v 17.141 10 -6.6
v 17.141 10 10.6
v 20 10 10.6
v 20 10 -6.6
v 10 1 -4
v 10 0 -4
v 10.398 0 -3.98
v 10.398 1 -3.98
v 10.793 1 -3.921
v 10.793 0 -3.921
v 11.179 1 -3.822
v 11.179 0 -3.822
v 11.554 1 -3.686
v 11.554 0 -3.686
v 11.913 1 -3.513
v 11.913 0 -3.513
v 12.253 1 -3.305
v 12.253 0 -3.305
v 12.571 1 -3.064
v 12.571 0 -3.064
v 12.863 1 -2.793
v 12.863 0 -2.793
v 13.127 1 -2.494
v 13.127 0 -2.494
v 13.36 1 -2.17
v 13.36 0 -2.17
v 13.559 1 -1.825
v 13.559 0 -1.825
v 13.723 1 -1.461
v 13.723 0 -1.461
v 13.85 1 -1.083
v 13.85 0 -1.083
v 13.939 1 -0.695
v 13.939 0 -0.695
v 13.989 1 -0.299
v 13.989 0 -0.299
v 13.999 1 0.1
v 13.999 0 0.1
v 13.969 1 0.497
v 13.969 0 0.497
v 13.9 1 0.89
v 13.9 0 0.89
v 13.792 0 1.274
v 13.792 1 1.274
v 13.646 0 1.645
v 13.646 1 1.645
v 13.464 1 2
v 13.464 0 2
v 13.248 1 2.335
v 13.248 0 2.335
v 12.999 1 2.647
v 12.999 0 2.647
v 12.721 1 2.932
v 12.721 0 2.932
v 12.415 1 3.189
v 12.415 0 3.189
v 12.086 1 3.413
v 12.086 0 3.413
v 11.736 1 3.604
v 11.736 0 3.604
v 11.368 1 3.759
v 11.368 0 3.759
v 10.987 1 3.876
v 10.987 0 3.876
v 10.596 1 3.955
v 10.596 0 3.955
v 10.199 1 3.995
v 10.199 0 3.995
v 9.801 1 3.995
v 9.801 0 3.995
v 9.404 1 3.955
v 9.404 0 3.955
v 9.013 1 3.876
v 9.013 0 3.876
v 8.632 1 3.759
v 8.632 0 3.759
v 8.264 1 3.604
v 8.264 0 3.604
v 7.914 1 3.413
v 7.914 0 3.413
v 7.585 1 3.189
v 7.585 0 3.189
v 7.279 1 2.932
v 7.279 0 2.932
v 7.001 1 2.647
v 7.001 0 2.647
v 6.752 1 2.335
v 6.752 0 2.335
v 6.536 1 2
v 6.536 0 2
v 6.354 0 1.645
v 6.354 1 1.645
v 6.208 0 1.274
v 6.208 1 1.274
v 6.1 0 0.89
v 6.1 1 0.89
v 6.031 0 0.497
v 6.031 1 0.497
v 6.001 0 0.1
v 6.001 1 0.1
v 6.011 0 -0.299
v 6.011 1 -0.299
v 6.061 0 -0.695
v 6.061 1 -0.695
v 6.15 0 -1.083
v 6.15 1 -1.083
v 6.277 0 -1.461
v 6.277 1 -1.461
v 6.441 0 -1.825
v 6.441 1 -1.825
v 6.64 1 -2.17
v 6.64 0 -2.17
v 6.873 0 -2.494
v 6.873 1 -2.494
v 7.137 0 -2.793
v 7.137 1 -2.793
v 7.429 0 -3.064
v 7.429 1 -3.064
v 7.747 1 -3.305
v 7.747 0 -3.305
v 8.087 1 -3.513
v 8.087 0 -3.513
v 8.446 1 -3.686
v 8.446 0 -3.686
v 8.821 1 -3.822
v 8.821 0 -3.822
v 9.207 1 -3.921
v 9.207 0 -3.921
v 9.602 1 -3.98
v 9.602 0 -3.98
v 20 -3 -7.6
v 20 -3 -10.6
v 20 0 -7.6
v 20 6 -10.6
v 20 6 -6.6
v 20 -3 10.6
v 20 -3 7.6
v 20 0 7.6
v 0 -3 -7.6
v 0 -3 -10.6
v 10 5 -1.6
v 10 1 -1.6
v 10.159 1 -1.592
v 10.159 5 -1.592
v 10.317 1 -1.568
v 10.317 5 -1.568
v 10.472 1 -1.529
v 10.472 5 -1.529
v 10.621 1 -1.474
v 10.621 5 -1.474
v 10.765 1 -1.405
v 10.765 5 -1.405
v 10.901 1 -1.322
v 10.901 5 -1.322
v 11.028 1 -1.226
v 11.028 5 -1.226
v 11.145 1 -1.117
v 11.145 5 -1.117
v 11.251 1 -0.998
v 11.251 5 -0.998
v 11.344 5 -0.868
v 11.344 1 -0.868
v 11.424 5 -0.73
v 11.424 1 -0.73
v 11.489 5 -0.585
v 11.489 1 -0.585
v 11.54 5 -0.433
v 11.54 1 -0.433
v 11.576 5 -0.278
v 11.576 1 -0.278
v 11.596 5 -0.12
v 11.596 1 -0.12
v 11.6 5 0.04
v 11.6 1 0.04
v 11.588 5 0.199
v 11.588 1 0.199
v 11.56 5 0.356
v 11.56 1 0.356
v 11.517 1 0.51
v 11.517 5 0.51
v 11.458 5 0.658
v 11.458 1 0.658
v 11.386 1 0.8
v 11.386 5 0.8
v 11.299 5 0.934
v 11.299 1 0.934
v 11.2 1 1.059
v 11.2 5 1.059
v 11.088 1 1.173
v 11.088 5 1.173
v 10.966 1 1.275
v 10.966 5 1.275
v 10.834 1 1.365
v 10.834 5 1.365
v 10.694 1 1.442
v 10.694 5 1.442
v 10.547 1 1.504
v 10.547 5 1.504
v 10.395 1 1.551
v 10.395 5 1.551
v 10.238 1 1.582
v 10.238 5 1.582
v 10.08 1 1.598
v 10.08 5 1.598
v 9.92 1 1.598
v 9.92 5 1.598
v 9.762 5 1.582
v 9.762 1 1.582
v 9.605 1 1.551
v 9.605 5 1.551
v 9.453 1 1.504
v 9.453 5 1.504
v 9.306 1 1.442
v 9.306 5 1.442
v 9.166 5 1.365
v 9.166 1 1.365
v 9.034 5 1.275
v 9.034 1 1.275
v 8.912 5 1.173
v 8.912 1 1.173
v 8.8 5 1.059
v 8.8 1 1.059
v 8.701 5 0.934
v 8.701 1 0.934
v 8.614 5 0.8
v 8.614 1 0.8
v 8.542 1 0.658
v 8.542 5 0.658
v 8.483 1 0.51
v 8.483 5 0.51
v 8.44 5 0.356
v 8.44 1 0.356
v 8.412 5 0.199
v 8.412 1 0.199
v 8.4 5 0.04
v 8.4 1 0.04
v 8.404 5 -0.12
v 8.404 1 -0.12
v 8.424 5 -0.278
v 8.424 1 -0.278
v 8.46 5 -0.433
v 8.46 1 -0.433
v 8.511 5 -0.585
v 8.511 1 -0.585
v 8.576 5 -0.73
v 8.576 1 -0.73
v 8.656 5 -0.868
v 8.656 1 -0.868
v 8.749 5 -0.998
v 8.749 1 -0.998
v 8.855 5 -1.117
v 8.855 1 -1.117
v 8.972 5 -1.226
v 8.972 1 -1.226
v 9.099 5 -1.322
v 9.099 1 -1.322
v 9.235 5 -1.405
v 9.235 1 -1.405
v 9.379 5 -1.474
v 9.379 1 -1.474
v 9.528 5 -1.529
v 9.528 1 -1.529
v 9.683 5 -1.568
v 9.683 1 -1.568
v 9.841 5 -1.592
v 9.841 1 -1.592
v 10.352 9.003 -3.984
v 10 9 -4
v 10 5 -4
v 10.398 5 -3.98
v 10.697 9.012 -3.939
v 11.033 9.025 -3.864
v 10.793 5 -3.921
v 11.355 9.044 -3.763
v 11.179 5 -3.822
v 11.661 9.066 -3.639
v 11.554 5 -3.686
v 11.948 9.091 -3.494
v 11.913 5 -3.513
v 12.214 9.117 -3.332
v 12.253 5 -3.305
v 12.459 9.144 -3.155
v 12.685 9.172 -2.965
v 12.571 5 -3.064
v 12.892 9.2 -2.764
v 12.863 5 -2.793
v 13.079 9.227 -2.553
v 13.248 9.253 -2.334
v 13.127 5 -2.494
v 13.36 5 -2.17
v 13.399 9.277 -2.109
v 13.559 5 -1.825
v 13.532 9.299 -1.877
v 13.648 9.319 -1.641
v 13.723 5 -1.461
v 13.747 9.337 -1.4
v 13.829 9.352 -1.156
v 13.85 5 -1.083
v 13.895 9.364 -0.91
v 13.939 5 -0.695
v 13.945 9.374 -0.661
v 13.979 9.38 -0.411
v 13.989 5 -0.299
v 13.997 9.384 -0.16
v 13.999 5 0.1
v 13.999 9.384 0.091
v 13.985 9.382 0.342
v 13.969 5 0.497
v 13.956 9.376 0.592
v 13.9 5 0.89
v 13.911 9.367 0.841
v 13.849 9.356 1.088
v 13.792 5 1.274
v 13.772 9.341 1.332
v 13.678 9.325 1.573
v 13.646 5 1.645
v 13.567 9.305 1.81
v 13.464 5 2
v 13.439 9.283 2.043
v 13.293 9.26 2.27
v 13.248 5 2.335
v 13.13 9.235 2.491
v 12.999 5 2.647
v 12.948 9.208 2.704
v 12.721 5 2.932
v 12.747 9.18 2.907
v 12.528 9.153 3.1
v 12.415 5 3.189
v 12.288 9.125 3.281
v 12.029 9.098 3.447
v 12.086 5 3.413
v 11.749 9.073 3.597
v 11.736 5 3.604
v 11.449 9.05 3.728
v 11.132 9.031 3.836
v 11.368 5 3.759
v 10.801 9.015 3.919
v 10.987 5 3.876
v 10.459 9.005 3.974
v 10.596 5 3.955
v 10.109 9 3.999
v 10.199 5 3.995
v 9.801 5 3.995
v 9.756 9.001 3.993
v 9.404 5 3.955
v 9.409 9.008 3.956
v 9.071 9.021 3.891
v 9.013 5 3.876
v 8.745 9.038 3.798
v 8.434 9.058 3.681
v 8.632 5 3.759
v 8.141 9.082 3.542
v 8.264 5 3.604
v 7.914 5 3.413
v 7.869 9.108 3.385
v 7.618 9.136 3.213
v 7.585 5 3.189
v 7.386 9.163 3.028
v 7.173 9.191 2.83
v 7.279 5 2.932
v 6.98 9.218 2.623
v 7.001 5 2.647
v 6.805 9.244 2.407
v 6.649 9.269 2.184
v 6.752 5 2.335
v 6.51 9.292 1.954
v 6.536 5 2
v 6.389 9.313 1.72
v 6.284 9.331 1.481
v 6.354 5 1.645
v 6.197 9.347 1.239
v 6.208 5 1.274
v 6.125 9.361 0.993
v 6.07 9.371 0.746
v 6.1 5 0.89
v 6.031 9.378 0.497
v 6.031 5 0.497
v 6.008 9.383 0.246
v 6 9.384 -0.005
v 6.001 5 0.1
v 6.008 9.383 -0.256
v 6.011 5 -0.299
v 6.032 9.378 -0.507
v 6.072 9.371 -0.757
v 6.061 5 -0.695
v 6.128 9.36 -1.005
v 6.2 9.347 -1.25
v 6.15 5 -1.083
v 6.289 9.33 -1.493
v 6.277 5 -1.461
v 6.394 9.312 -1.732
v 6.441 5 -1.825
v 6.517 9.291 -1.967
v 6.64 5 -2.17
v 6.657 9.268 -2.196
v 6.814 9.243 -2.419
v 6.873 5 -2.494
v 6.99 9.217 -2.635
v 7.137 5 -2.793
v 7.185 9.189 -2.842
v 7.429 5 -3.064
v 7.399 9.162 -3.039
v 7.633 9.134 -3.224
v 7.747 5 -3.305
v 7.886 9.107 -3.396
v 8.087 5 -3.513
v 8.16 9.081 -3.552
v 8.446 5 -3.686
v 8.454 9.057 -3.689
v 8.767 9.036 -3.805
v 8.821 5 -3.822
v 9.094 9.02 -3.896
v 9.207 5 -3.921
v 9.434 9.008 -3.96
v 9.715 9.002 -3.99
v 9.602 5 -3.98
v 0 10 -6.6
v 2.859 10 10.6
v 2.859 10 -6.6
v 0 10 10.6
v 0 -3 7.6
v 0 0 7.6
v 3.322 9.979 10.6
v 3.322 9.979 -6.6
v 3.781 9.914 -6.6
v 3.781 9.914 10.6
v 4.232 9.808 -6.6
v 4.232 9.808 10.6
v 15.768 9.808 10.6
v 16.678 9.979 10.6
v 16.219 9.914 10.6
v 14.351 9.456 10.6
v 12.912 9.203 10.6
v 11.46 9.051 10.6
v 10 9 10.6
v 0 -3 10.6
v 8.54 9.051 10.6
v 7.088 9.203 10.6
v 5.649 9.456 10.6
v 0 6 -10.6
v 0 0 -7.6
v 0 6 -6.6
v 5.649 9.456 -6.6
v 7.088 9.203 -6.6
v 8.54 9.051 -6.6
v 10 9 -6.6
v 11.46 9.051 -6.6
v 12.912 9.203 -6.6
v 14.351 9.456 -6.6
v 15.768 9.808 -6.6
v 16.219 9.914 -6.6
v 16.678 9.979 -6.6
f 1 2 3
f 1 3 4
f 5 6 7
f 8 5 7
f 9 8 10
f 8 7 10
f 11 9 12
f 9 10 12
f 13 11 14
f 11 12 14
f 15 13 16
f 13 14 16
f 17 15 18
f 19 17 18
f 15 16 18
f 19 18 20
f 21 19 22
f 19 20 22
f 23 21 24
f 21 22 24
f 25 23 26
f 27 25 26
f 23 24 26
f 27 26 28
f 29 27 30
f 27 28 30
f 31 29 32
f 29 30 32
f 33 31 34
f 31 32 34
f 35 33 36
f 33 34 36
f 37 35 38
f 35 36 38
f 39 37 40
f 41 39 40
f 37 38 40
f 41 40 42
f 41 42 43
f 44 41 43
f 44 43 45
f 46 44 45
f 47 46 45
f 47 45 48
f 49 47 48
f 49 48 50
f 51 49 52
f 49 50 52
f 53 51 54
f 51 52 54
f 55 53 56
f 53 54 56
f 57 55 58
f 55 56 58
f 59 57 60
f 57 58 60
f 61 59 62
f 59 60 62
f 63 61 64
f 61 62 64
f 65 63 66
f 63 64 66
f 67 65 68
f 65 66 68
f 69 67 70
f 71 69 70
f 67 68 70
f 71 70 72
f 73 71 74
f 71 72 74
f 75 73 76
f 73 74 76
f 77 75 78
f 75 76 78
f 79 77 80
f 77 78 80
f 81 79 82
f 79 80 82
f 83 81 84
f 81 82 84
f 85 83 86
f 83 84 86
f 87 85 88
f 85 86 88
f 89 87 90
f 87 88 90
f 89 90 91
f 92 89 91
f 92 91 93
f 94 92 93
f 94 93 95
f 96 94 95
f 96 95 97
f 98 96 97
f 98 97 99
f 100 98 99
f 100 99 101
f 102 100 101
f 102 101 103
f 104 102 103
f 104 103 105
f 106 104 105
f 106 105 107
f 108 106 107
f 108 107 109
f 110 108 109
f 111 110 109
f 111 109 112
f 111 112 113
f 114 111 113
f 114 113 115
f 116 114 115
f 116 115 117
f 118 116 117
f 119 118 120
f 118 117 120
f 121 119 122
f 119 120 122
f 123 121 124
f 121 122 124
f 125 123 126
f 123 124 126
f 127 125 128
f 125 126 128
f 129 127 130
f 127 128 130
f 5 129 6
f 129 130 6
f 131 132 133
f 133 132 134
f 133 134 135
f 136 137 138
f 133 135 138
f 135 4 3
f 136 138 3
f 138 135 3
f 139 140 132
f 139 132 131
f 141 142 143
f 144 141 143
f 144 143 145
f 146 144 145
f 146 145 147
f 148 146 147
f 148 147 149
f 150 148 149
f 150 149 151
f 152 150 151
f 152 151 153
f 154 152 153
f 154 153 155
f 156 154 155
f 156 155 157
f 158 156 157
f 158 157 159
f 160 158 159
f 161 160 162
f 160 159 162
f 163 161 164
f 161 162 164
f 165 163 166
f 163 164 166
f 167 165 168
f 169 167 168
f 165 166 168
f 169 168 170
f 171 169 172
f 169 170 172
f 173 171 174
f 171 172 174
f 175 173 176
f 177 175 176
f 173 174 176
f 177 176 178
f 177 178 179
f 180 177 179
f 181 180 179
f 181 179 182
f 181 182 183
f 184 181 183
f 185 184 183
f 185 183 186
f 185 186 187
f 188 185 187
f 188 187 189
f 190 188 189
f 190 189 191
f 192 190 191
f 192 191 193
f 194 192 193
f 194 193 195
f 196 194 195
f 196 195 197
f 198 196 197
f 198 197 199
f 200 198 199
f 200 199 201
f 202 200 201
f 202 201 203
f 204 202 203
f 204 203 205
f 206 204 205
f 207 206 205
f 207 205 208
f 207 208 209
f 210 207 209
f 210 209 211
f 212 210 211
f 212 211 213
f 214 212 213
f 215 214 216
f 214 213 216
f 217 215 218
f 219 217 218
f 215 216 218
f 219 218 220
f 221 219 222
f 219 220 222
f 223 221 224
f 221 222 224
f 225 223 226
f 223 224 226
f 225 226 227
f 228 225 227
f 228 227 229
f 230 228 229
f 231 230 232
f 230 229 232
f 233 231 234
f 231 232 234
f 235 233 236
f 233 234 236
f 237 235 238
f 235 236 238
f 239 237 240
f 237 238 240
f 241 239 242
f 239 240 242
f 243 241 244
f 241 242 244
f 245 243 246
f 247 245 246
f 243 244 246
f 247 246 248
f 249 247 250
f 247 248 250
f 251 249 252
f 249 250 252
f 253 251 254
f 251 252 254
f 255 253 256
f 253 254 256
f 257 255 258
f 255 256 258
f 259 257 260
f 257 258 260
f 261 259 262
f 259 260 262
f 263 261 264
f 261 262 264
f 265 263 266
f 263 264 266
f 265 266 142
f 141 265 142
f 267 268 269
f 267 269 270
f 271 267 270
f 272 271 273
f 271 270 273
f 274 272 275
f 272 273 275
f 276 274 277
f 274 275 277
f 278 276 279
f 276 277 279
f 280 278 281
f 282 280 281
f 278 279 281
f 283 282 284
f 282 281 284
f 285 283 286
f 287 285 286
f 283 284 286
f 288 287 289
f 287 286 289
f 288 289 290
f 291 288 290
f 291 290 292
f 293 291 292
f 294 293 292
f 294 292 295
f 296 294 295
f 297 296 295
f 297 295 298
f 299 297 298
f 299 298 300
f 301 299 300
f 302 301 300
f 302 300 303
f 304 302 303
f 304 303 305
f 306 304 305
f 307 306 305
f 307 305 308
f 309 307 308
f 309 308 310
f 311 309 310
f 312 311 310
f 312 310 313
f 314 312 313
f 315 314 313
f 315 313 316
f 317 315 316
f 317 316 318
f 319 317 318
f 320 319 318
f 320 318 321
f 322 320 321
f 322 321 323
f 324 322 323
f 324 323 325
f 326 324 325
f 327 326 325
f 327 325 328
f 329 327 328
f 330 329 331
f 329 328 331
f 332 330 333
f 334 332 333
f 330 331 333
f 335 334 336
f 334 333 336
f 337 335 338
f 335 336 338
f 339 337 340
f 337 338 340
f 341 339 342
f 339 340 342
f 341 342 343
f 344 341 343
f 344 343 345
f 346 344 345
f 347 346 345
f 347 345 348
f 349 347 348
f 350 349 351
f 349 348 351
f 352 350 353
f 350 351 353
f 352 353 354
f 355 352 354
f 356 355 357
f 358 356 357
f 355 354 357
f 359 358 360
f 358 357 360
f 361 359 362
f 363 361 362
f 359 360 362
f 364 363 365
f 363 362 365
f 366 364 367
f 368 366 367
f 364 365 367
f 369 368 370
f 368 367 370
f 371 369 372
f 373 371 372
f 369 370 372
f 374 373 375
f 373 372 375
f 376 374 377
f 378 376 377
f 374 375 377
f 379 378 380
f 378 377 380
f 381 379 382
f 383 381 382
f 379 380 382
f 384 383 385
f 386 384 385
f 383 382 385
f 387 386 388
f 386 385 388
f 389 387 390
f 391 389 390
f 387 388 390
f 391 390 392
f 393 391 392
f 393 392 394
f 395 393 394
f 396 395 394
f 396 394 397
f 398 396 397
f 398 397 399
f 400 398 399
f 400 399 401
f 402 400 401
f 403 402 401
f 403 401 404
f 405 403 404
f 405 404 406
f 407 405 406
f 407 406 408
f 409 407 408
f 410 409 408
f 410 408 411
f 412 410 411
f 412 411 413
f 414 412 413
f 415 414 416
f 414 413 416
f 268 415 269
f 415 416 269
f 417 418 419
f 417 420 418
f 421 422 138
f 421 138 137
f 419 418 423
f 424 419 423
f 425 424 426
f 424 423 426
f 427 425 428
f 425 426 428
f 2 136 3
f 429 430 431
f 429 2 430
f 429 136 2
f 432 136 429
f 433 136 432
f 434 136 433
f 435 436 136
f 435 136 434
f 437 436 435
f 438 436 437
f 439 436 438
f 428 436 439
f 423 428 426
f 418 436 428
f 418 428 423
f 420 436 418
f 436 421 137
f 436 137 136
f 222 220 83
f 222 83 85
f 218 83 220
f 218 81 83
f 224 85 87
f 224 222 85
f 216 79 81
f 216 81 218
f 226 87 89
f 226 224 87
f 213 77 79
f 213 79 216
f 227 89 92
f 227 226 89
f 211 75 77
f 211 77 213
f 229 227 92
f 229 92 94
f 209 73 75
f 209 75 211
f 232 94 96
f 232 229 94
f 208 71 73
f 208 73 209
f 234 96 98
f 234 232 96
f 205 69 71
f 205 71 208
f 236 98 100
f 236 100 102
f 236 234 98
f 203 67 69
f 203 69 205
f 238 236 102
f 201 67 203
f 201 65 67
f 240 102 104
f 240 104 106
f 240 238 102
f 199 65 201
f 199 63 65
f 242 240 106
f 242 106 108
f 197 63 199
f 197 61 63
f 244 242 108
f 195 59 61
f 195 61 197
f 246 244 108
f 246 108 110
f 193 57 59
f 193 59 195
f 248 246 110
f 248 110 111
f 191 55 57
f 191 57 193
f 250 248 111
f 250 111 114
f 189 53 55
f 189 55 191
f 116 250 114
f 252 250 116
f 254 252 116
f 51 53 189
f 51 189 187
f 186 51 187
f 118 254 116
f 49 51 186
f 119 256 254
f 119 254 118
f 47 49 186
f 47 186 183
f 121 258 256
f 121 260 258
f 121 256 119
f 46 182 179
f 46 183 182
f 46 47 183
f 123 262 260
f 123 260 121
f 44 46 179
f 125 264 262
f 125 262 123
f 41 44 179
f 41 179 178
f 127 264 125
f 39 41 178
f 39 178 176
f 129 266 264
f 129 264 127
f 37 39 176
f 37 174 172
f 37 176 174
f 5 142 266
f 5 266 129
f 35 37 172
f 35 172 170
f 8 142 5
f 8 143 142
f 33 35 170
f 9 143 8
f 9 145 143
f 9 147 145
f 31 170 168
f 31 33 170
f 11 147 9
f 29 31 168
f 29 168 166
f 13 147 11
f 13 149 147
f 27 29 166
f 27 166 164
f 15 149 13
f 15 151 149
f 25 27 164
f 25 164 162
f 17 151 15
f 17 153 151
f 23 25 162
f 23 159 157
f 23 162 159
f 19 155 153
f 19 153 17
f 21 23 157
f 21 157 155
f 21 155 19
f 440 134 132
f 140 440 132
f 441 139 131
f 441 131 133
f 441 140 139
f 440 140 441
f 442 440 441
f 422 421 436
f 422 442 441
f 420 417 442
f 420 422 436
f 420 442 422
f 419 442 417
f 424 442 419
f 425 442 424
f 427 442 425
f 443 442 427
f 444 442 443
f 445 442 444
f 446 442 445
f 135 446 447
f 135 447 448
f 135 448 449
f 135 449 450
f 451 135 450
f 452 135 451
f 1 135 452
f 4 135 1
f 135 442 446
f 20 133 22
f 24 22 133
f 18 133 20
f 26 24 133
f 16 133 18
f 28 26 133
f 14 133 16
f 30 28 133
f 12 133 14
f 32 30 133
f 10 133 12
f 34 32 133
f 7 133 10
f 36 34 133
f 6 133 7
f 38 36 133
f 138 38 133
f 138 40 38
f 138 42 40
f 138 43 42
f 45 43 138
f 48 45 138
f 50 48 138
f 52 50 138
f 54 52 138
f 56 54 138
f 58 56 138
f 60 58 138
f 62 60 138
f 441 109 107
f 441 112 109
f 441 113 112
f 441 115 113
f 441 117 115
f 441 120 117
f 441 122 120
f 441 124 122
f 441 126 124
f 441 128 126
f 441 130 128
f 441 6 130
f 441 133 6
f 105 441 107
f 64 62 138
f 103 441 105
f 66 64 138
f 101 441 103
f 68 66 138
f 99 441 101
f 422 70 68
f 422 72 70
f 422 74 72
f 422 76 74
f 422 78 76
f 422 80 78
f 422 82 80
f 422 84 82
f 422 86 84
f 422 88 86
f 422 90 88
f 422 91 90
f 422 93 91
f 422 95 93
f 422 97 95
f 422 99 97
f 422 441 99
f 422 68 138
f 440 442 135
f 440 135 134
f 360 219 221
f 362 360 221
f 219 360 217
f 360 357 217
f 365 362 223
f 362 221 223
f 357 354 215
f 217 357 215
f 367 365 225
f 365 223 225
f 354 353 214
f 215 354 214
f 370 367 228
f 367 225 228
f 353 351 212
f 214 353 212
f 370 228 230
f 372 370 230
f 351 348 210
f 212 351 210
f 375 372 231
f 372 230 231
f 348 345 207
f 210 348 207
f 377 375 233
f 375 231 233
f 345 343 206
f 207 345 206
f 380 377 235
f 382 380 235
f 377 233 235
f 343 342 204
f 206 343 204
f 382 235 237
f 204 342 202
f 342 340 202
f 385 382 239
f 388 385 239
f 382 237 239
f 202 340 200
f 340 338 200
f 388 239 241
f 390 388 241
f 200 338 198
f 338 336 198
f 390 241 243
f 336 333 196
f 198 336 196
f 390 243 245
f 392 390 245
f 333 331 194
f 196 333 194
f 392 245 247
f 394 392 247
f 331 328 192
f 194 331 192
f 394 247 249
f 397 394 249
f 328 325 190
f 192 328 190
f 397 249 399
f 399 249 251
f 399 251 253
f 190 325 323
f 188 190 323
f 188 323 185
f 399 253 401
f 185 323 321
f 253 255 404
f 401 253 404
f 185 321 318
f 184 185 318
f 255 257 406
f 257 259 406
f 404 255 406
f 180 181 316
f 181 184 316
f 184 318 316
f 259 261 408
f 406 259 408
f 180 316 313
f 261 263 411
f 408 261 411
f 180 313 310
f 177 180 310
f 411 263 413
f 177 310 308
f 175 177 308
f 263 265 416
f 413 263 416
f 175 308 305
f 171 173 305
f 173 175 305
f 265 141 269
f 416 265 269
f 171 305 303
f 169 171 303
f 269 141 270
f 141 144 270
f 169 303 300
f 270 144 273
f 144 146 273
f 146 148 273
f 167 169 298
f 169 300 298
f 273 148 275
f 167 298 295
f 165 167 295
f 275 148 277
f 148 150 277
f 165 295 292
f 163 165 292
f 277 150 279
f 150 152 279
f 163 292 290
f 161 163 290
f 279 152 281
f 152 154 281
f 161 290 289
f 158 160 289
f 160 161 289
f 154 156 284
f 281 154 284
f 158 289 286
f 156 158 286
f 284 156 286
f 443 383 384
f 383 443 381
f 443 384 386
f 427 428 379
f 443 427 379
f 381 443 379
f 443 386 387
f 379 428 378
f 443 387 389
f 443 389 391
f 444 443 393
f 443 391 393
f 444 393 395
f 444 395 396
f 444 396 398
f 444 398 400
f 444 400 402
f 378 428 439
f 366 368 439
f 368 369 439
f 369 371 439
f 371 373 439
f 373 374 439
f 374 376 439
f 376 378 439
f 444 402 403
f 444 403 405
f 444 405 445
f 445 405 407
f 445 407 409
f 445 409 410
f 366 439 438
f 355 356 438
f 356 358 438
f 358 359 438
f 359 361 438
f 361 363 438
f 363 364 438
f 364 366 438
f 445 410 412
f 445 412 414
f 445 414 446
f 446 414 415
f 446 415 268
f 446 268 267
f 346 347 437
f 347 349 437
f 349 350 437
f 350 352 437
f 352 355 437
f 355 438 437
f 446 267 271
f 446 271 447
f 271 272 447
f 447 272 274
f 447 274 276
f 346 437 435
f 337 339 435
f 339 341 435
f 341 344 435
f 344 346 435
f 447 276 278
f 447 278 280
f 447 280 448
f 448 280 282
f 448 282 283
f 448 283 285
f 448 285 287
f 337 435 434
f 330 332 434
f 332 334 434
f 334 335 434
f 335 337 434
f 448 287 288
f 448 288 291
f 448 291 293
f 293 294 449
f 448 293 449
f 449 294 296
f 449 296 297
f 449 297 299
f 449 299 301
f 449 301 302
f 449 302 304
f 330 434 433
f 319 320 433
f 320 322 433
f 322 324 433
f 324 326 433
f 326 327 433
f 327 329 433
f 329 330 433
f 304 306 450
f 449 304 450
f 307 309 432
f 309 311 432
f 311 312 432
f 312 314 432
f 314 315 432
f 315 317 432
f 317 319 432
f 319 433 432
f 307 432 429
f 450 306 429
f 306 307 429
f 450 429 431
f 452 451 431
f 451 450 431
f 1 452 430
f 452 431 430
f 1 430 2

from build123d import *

# Parameters (mm, degrees)
EXTRUDE_1_DEPTH     = 20
SKETCH_2_R          = 21
CUT_EXTRUDE_1_DEPTH = 31.812984276
SKETCH_3_R          = 1.6
CUT_EXTRUDE_2_DEPTH = 25.745908753
SKETCH_4_R          = 4
CUT_EXTRUDE_3_DEPTH = 25.007498873
FILLET_1_R          = 5
SKETCH_5_W          = 4
SKETCH_5_H          = 4
CUT_EXTRUDE_4_DEPTH = 25.745908796
SKETCH_6_R          = 4
CUT_EXTRUDE_5_DEPTH = 1


with BuildPart() as part:
    # 草图1 → 凸台-拉伸1 (new body)
    with BuildSketch(Plane(origin=(0, 0, 0), x_dir=(0, 0, -1), z_dir=(1, 0, 0))):
        Polygon((-10.6, 10), (10.6, 10), (10.6, -3), (7.6, -3), (7.6, 0), (-7.6, 0), (-7.6, -3), (-10.6, -3), align=None)
    extrude(amount=EXTRUDE_1_DEPTH)

    # 草图2 → 切除-拉伸1 (cut, through all)
    with BuildSketch(Plane.XY.offset(10.6)):
        with Locations((10, 30)):
            Circle(SKETCH_2_R)
    extrude(amount=-CUT_EXTRUDE_1_DEPTH, mode=Mode.SUBTRACT)

    # 草图3 → 切除-拉伸2 (cut, through all)
    with BuildSketch(Plane.XZ):
        with Locations(Location((10, 0, 0), (0, 0, 270))):
            Circle(SKETCH_3_R)
    extrude(amount=-CUT_EXTRUDE_2_DEPTH, mode=Mode.SUBTRACT)

    # 草图4 → 切除-拉伸3 (cut, through all)
    with BuildSketch(Plane(origin=(0, 5, 0), x_dir=(-1, 0, 0), z_dir=(0, -1, 0))):
        with Locations(Location((-10, 0, 0), (0, 0, 90))):
            Circle(SKETCH_4_R)
    extrude(amount=-CUT_EXTRUDE_3_DEPTH, mode=Mode.SUBTRACT)

    # 圆角1
    fillet_1_edges = [part.edges().sort_by_distance(p)[0] for p in [
        (16.403124237, 10, 0),
        (3.596875763, 10, 0),
    ]]
    fillet(fillet_1_edges, radius=FILLET_1_R)

    # 草图5 → 切除-拉伸4 (cut, through all)
    with BuildSketch(Plane(origin=(20, 0, 0), x_dir=(0, 0, -1), z_dir=(1, 0, 0))):
        with Locations((8.6, 8)):
            Rectangle(SKETCH_5_W, SKETCH_5_H)
    extrude(amount=-CUT_EXTRUDE_4_DEPTH, mode=Mode.SUBTRACT)

    # 草图6 → 切除-拉伸5 (cut)
    with BuildSketch(Plane.XZ):
        with Locations(Location((10, 0, 0), (0, 0, 270))):
            Circle(SKETCH_6_R)
    extrude(amount=-CUT_EXTRUDE_5_DEPTH, mode=Mode.SUBTRACT)


solid = part.part
